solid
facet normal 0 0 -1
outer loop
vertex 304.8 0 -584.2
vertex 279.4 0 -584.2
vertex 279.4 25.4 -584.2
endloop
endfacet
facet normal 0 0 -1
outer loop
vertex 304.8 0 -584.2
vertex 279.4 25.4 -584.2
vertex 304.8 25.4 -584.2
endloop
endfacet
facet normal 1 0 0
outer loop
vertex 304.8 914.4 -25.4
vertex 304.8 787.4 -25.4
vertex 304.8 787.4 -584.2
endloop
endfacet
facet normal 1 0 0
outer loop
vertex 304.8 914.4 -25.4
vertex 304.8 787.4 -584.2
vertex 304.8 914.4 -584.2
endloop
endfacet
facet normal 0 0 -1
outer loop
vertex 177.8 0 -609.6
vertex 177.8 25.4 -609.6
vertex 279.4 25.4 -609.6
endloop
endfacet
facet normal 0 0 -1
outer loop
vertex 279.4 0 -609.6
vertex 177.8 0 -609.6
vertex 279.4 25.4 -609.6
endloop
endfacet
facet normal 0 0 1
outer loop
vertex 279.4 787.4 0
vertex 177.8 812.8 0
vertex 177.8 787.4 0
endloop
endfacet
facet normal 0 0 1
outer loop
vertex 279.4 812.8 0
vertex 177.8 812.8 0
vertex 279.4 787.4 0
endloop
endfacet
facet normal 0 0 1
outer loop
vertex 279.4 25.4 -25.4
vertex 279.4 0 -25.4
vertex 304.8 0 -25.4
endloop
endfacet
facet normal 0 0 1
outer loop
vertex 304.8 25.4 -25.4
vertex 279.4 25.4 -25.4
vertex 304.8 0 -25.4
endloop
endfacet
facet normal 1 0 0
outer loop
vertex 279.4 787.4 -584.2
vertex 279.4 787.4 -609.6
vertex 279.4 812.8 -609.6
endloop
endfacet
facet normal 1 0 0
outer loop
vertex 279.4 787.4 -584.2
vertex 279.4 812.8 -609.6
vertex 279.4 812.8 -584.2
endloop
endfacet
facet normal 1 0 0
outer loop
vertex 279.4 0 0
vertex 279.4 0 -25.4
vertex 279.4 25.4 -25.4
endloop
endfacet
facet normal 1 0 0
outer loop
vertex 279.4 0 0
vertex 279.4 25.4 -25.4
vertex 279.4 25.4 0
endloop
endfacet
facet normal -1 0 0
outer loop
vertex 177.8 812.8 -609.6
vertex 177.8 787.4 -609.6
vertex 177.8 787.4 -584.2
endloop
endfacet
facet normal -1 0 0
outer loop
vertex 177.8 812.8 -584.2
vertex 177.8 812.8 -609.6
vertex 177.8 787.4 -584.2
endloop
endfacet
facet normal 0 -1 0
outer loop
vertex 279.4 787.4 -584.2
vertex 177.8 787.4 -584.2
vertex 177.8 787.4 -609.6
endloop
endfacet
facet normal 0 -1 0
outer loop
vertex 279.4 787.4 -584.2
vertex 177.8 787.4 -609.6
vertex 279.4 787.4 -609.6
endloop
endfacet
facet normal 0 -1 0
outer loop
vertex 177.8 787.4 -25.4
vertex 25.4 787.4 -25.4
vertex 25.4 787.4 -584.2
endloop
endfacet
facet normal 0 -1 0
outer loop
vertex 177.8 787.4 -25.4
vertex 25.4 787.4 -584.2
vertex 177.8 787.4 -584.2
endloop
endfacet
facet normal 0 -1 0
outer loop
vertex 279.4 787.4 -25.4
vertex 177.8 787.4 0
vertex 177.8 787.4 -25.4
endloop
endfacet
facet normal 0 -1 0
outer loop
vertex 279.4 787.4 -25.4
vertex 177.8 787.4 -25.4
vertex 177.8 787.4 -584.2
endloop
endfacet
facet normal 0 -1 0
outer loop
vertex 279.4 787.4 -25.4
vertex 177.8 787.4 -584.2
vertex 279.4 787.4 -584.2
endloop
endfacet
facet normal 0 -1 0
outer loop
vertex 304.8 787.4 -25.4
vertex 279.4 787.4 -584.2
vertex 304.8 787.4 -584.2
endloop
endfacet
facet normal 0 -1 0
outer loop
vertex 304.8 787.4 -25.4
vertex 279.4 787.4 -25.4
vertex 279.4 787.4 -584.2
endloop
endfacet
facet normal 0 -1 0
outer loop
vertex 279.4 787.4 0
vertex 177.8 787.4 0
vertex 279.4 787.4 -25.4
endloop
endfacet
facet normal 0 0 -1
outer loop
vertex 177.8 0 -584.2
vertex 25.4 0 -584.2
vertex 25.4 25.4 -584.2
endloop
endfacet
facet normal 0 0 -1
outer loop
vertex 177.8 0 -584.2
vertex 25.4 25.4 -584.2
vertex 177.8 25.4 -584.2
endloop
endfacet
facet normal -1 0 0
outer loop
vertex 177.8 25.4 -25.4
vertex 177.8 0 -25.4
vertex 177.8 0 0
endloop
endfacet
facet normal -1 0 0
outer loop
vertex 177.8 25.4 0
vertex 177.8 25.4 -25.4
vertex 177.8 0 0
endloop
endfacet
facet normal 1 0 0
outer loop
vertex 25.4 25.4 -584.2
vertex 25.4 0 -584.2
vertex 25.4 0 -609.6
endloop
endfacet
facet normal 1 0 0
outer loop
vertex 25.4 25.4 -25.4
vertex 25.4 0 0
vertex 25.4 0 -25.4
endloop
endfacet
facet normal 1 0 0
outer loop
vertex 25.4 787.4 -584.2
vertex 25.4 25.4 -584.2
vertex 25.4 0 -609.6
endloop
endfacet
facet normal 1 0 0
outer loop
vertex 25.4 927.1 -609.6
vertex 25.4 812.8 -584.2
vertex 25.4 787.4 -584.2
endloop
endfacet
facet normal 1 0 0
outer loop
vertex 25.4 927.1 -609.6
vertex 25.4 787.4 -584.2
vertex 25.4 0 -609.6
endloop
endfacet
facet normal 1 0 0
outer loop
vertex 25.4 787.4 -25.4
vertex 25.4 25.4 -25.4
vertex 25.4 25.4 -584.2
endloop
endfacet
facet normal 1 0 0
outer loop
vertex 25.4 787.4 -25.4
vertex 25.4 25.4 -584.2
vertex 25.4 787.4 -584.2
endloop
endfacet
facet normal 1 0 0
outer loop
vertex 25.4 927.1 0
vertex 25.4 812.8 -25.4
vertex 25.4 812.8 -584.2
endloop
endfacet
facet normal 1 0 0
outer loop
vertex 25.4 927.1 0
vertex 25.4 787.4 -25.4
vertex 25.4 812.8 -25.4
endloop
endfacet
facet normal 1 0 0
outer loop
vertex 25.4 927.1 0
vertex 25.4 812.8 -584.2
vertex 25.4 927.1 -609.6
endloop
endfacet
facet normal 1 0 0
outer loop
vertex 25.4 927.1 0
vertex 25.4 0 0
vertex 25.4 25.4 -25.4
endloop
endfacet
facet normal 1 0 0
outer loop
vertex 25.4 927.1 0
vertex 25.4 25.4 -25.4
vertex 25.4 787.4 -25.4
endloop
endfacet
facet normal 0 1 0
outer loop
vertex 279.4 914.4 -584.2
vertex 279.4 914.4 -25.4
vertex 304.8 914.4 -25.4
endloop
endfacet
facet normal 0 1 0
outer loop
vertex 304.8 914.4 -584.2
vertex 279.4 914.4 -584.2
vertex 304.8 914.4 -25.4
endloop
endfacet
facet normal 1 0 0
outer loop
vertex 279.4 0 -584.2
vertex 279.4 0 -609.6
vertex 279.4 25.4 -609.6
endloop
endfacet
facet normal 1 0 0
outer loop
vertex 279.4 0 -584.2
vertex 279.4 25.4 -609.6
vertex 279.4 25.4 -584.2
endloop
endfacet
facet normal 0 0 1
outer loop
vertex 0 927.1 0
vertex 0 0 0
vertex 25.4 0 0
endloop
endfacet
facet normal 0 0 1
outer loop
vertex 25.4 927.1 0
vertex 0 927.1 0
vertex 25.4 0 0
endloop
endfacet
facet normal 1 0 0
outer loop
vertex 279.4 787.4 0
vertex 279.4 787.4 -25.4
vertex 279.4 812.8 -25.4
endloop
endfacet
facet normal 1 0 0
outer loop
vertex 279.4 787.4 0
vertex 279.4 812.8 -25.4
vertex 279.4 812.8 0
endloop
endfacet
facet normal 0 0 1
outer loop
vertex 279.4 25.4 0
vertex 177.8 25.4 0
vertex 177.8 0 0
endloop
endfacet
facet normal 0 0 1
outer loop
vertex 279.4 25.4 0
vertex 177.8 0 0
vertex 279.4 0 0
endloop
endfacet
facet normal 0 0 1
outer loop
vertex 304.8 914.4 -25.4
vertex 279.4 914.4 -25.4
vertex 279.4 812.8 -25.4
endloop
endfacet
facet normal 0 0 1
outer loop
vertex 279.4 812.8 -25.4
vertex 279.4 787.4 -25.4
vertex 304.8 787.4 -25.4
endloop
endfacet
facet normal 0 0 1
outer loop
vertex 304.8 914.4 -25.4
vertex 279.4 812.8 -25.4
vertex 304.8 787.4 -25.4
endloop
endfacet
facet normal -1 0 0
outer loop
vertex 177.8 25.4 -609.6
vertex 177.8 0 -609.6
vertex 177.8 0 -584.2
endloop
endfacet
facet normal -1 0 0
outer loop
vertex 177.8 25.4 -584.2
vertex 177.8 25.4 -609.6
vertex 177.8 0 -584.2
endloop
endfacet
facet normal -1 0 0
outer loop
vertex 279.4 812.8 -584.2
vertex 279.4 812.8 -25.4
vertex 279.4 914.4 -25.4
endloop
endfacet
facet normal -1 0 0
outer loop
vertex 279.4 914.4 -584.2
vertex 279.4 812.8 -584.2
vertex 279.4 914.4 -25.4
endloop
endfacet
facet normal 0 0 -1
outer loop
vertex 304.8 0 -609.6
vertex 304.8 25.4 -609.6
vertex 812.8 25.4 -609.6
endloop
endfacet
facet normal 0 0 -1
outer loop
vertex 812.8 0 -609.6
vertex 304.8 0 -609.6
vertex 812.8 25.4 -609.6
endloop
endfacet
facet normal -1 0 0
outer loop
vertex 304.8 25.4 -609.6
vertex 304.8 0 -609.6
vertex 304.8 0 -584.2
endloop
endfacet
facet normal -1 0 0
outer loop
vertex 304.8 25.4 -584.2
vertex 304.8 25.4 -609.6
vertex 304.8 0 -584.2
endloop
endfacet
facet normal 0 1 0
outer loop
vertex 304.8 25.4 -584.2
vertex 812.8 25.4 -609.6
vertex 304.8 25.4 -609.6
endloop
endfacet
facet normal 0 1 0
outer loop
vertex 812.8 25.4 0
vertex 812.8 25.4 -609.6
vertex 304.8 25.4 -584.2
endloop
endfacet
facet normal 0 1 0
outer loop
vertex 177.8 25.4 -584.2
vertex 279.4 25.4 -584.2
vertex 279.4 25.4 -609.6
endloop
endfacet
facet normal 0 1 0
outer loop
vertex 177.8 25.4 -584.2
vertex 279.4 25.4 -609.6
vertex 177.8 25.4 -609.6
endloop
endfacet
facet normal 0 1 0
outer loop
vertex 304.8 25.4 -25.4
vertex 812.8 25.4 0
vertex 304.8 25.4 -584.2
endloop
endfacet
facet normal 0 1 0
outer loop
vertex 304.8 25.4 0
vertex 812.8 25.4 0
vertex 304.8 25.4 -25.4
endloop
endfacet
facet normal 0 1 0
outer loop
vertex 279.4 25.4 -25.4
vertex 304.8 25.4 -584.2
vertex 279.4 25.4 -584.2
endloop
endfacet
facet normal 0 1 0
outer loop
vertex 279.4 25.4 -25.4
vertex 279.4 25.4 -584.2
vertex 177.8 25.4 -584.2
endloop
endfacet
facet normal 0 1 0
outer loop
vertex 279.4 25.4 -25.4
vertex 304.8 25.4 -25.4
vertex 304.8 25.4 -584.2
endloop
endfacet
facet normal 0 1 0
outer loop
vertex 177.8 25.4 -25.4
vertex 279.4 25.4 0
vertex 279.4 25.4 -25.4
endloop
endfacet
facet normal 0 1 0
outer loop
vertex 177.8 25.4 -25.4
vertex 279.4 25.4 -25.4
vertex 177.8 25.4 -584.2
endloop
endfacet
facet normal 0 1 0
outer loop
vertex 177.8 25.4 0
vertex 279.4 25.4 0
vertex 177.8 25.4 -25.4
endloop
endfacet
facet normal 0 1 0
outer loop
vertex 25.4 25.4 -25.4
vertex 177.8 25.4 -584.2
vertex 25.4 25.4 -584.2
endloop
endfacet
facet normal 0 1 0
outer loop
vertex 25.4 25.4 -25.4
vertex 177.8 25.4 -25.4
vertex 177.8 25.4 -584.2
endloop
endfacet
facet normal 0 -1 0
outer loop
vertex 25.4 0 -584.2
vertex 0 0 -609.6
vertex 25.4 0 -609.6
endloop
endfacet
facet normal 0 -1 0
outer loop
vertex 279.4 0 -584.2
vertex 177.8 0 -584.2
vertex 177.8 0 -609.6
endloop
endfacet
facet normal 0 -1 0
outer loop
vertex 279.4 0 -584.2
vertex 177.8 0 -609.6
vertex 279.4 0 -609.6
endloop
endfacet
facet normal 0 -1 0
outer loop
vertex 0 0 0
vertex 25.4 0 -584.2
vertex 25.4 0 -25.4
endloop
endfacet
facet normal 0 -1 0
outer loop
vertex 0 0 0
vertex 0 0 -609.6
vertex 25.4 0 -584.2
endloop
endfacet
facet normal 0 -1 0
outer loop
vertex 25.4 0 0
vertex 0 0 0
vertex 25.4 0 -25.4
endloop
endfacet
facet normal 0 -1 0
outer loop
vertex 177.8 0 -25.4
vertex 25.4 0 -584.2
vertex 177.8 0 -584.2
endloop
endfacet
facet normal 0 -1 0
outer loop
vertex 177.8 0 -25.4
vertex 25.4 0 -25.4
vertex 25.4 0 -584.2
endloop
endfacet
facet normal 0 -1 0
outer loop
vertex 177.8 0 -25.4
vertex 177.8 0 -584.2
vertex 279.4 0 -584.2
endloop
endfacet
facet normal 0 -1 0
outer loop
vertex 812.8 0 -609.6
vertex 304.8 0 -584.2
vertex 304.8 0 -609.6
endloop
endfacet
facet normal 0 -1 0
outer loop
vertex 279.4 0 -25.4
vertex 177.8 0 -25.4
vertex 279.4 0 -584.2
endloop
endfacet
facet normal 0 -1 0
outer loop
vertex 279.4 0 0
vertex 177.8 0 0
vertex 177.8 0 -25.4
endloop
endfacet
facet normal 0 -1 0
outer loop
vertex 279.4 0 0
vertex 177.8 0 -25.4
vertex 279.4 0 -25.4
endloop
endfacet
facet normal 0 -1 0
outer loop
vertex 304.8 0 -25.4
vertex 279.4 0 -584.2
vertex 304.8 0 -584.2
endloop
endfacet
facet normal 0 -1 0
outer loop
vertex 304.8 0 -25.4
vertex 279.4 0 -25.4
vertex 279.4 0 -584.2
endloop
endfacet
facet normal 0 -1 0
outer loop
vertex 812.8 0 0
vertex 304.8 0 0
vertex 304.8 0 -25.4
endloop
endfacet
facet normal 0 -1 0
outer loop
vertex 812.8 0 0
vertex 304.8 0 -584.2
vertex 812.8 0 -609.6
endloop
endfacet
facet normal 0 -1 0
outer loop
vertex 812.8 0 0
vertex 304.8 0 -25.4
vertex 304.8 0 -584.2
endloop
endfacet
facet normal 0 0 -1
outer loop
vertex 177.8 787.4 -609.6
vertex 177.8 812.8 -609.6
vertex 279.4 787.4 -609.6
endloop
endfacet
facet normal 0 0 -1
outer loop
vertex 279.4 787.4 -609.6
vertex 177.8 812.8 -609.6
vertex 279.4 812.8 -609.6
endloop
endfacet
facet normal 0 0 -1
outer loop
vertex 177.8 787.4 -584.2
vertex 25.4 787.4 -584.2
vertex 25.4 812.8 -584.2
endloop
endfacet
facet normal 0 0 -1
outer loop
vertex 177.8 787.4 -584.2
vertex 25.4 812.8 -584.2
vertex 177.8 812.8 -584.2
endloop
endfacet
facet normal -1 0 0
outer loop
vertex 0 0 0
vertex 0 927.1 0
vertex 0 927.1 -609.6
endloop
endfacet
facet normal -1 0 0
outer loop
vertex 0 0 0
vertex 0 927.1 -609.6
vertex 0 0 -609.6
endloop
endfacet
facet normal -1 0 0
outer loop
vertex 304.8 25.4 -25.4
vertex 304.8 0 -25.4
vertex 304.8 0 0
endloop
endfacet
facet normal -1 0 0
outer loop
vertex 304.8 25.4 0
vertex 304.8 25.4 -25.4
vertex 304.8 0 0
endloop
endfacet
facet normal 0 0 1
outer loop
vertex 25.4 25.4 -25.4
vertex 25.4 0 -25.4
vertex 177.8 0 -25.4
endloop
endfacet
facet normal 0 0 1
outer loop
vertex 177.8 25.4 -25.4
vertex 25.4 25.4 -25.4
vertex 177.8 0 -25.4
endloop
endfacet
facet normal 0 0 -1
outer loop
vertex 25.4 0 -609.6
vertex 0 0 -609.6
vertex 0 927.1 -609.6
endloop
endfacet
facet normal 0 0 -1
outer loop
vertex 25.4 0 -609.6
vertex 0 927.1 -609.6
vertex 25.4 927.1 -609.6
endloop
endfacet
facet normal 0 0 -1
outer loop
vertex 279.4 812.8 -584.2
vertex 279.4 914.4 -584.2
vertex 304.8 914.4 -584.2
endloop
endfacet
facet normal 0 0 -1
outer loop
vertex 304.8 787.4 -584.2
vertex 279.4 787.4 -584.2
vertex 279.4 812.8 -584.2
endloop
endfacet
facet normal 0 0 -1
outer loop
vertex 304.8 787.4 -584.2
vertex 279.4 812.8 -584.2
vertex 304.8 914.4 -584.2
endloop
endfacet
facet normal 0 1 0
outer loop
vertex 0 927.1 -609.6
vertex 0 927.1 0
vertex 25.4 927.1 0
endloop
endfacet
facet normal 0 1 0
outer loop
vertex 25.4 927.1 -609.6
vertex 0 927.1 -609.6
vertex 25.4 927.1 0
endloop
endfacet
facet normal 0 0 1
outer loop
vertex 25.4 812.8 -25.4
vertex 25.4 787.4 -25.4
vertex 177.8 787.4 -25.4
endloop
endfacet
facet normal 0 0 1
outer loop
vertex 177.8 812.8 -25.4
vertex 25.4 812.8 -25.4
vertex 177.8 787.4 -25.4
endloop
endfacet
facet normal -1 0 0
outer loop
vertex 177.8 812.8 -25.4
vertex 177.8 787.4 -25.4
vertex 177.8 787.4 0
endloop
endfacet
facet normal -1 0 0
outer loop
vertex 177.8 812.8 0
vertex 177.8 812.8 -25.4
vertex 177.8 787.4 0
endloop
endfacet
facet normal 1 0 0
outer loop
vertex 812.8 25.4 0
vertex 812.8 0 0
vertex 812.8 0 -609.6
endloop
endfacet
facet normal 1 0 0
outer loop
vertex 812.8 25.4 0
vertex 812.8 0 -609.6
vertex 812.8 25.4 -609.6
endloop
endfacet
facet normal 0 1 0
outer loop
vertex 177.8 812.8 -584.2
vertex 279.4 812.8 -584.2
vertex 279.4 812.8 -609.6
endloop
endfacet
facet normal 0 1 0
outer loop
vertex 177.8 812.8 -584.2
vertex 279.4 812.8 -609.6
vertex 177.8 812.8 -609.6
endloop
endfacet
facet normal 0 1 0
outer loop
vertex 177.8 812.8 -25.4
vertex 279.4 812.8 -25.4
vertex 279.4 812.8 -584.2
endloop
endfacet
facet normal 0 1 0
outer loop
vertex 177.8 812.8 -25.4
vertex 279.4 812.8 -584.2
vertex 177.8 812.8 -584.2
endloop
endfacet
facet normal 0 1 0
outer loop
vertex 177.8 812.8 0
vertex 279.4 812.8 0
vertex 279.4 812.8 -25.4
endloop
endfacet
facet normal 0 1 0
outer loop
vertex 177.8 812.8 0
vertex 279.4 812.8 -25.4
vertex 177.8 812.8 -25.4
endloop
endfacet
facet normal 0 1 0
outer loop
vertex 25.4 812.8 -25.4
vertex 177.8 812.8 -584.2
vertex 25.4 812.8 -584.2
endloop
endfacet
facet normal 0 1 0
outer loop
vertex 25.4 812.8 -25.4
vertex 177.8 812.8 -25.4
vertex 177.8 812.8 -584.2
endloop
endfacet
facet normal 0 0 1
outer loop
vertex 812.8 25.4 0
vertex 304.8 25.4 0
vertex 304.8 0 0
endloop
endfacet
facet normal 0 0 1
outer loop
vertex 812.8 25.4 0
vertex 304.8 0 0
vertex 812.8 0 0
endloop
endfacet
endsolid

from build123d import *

# Parameters (mm, degrees)
F1_DEPTH = 609.6
F2_W     = 25.4
F2_H     = 101.6
F2_H_2   = 114.3
F3_DEPTH = 609.6
F4_W     = 152.4
F4_H     = 25.4
F4_W_2   = 25.4
F5_DEPTH = 2032


with BuildPart() as f1:
    # F0 (on Top) → F1 (new body)
    with BuildSketch(Plane.XY):
        Polygon((304.8, 812.8), (0, 812.8), (0, 0), (812.8, 0), (812.8, 25.4), (25.4, 25.4), (25.4, 787.4), (304.8, 787.4), align=None)
    extrude(amount=-F1_DEPTH)

    # F2 (on face) → F3 (join)
    with BuildSketch(Plane.XY):
        with Locations((292.1, 863.6)):
            Rectangle(F2_W, F2_H)
        with Locations((12.7, 869.95)):
            Rectangle(F2_W, F2_H_2)
    extrude(amount=-F3_DEPTH)

    # F4 (on Front) → F5 (cut)
    with BuildSketch(Plane.XZ):
        with Locations((101.6, -12.7)):
            Rectangle(F4_W, F4_H)
        with Locations((292.1, -12.7)):
            Rectangle(F4_W_2, F4_H)
        with Locations((101.6, -596.9)):
            Rectangle(F4_W, F4_H)
        with Locations((292.1, -596.9)):
            Rectangle(F4_W_2, F4_H)
    extrude(amount=-F5_DEPTH, mode=Mode.SUBTRACT)


solid = f1.part
